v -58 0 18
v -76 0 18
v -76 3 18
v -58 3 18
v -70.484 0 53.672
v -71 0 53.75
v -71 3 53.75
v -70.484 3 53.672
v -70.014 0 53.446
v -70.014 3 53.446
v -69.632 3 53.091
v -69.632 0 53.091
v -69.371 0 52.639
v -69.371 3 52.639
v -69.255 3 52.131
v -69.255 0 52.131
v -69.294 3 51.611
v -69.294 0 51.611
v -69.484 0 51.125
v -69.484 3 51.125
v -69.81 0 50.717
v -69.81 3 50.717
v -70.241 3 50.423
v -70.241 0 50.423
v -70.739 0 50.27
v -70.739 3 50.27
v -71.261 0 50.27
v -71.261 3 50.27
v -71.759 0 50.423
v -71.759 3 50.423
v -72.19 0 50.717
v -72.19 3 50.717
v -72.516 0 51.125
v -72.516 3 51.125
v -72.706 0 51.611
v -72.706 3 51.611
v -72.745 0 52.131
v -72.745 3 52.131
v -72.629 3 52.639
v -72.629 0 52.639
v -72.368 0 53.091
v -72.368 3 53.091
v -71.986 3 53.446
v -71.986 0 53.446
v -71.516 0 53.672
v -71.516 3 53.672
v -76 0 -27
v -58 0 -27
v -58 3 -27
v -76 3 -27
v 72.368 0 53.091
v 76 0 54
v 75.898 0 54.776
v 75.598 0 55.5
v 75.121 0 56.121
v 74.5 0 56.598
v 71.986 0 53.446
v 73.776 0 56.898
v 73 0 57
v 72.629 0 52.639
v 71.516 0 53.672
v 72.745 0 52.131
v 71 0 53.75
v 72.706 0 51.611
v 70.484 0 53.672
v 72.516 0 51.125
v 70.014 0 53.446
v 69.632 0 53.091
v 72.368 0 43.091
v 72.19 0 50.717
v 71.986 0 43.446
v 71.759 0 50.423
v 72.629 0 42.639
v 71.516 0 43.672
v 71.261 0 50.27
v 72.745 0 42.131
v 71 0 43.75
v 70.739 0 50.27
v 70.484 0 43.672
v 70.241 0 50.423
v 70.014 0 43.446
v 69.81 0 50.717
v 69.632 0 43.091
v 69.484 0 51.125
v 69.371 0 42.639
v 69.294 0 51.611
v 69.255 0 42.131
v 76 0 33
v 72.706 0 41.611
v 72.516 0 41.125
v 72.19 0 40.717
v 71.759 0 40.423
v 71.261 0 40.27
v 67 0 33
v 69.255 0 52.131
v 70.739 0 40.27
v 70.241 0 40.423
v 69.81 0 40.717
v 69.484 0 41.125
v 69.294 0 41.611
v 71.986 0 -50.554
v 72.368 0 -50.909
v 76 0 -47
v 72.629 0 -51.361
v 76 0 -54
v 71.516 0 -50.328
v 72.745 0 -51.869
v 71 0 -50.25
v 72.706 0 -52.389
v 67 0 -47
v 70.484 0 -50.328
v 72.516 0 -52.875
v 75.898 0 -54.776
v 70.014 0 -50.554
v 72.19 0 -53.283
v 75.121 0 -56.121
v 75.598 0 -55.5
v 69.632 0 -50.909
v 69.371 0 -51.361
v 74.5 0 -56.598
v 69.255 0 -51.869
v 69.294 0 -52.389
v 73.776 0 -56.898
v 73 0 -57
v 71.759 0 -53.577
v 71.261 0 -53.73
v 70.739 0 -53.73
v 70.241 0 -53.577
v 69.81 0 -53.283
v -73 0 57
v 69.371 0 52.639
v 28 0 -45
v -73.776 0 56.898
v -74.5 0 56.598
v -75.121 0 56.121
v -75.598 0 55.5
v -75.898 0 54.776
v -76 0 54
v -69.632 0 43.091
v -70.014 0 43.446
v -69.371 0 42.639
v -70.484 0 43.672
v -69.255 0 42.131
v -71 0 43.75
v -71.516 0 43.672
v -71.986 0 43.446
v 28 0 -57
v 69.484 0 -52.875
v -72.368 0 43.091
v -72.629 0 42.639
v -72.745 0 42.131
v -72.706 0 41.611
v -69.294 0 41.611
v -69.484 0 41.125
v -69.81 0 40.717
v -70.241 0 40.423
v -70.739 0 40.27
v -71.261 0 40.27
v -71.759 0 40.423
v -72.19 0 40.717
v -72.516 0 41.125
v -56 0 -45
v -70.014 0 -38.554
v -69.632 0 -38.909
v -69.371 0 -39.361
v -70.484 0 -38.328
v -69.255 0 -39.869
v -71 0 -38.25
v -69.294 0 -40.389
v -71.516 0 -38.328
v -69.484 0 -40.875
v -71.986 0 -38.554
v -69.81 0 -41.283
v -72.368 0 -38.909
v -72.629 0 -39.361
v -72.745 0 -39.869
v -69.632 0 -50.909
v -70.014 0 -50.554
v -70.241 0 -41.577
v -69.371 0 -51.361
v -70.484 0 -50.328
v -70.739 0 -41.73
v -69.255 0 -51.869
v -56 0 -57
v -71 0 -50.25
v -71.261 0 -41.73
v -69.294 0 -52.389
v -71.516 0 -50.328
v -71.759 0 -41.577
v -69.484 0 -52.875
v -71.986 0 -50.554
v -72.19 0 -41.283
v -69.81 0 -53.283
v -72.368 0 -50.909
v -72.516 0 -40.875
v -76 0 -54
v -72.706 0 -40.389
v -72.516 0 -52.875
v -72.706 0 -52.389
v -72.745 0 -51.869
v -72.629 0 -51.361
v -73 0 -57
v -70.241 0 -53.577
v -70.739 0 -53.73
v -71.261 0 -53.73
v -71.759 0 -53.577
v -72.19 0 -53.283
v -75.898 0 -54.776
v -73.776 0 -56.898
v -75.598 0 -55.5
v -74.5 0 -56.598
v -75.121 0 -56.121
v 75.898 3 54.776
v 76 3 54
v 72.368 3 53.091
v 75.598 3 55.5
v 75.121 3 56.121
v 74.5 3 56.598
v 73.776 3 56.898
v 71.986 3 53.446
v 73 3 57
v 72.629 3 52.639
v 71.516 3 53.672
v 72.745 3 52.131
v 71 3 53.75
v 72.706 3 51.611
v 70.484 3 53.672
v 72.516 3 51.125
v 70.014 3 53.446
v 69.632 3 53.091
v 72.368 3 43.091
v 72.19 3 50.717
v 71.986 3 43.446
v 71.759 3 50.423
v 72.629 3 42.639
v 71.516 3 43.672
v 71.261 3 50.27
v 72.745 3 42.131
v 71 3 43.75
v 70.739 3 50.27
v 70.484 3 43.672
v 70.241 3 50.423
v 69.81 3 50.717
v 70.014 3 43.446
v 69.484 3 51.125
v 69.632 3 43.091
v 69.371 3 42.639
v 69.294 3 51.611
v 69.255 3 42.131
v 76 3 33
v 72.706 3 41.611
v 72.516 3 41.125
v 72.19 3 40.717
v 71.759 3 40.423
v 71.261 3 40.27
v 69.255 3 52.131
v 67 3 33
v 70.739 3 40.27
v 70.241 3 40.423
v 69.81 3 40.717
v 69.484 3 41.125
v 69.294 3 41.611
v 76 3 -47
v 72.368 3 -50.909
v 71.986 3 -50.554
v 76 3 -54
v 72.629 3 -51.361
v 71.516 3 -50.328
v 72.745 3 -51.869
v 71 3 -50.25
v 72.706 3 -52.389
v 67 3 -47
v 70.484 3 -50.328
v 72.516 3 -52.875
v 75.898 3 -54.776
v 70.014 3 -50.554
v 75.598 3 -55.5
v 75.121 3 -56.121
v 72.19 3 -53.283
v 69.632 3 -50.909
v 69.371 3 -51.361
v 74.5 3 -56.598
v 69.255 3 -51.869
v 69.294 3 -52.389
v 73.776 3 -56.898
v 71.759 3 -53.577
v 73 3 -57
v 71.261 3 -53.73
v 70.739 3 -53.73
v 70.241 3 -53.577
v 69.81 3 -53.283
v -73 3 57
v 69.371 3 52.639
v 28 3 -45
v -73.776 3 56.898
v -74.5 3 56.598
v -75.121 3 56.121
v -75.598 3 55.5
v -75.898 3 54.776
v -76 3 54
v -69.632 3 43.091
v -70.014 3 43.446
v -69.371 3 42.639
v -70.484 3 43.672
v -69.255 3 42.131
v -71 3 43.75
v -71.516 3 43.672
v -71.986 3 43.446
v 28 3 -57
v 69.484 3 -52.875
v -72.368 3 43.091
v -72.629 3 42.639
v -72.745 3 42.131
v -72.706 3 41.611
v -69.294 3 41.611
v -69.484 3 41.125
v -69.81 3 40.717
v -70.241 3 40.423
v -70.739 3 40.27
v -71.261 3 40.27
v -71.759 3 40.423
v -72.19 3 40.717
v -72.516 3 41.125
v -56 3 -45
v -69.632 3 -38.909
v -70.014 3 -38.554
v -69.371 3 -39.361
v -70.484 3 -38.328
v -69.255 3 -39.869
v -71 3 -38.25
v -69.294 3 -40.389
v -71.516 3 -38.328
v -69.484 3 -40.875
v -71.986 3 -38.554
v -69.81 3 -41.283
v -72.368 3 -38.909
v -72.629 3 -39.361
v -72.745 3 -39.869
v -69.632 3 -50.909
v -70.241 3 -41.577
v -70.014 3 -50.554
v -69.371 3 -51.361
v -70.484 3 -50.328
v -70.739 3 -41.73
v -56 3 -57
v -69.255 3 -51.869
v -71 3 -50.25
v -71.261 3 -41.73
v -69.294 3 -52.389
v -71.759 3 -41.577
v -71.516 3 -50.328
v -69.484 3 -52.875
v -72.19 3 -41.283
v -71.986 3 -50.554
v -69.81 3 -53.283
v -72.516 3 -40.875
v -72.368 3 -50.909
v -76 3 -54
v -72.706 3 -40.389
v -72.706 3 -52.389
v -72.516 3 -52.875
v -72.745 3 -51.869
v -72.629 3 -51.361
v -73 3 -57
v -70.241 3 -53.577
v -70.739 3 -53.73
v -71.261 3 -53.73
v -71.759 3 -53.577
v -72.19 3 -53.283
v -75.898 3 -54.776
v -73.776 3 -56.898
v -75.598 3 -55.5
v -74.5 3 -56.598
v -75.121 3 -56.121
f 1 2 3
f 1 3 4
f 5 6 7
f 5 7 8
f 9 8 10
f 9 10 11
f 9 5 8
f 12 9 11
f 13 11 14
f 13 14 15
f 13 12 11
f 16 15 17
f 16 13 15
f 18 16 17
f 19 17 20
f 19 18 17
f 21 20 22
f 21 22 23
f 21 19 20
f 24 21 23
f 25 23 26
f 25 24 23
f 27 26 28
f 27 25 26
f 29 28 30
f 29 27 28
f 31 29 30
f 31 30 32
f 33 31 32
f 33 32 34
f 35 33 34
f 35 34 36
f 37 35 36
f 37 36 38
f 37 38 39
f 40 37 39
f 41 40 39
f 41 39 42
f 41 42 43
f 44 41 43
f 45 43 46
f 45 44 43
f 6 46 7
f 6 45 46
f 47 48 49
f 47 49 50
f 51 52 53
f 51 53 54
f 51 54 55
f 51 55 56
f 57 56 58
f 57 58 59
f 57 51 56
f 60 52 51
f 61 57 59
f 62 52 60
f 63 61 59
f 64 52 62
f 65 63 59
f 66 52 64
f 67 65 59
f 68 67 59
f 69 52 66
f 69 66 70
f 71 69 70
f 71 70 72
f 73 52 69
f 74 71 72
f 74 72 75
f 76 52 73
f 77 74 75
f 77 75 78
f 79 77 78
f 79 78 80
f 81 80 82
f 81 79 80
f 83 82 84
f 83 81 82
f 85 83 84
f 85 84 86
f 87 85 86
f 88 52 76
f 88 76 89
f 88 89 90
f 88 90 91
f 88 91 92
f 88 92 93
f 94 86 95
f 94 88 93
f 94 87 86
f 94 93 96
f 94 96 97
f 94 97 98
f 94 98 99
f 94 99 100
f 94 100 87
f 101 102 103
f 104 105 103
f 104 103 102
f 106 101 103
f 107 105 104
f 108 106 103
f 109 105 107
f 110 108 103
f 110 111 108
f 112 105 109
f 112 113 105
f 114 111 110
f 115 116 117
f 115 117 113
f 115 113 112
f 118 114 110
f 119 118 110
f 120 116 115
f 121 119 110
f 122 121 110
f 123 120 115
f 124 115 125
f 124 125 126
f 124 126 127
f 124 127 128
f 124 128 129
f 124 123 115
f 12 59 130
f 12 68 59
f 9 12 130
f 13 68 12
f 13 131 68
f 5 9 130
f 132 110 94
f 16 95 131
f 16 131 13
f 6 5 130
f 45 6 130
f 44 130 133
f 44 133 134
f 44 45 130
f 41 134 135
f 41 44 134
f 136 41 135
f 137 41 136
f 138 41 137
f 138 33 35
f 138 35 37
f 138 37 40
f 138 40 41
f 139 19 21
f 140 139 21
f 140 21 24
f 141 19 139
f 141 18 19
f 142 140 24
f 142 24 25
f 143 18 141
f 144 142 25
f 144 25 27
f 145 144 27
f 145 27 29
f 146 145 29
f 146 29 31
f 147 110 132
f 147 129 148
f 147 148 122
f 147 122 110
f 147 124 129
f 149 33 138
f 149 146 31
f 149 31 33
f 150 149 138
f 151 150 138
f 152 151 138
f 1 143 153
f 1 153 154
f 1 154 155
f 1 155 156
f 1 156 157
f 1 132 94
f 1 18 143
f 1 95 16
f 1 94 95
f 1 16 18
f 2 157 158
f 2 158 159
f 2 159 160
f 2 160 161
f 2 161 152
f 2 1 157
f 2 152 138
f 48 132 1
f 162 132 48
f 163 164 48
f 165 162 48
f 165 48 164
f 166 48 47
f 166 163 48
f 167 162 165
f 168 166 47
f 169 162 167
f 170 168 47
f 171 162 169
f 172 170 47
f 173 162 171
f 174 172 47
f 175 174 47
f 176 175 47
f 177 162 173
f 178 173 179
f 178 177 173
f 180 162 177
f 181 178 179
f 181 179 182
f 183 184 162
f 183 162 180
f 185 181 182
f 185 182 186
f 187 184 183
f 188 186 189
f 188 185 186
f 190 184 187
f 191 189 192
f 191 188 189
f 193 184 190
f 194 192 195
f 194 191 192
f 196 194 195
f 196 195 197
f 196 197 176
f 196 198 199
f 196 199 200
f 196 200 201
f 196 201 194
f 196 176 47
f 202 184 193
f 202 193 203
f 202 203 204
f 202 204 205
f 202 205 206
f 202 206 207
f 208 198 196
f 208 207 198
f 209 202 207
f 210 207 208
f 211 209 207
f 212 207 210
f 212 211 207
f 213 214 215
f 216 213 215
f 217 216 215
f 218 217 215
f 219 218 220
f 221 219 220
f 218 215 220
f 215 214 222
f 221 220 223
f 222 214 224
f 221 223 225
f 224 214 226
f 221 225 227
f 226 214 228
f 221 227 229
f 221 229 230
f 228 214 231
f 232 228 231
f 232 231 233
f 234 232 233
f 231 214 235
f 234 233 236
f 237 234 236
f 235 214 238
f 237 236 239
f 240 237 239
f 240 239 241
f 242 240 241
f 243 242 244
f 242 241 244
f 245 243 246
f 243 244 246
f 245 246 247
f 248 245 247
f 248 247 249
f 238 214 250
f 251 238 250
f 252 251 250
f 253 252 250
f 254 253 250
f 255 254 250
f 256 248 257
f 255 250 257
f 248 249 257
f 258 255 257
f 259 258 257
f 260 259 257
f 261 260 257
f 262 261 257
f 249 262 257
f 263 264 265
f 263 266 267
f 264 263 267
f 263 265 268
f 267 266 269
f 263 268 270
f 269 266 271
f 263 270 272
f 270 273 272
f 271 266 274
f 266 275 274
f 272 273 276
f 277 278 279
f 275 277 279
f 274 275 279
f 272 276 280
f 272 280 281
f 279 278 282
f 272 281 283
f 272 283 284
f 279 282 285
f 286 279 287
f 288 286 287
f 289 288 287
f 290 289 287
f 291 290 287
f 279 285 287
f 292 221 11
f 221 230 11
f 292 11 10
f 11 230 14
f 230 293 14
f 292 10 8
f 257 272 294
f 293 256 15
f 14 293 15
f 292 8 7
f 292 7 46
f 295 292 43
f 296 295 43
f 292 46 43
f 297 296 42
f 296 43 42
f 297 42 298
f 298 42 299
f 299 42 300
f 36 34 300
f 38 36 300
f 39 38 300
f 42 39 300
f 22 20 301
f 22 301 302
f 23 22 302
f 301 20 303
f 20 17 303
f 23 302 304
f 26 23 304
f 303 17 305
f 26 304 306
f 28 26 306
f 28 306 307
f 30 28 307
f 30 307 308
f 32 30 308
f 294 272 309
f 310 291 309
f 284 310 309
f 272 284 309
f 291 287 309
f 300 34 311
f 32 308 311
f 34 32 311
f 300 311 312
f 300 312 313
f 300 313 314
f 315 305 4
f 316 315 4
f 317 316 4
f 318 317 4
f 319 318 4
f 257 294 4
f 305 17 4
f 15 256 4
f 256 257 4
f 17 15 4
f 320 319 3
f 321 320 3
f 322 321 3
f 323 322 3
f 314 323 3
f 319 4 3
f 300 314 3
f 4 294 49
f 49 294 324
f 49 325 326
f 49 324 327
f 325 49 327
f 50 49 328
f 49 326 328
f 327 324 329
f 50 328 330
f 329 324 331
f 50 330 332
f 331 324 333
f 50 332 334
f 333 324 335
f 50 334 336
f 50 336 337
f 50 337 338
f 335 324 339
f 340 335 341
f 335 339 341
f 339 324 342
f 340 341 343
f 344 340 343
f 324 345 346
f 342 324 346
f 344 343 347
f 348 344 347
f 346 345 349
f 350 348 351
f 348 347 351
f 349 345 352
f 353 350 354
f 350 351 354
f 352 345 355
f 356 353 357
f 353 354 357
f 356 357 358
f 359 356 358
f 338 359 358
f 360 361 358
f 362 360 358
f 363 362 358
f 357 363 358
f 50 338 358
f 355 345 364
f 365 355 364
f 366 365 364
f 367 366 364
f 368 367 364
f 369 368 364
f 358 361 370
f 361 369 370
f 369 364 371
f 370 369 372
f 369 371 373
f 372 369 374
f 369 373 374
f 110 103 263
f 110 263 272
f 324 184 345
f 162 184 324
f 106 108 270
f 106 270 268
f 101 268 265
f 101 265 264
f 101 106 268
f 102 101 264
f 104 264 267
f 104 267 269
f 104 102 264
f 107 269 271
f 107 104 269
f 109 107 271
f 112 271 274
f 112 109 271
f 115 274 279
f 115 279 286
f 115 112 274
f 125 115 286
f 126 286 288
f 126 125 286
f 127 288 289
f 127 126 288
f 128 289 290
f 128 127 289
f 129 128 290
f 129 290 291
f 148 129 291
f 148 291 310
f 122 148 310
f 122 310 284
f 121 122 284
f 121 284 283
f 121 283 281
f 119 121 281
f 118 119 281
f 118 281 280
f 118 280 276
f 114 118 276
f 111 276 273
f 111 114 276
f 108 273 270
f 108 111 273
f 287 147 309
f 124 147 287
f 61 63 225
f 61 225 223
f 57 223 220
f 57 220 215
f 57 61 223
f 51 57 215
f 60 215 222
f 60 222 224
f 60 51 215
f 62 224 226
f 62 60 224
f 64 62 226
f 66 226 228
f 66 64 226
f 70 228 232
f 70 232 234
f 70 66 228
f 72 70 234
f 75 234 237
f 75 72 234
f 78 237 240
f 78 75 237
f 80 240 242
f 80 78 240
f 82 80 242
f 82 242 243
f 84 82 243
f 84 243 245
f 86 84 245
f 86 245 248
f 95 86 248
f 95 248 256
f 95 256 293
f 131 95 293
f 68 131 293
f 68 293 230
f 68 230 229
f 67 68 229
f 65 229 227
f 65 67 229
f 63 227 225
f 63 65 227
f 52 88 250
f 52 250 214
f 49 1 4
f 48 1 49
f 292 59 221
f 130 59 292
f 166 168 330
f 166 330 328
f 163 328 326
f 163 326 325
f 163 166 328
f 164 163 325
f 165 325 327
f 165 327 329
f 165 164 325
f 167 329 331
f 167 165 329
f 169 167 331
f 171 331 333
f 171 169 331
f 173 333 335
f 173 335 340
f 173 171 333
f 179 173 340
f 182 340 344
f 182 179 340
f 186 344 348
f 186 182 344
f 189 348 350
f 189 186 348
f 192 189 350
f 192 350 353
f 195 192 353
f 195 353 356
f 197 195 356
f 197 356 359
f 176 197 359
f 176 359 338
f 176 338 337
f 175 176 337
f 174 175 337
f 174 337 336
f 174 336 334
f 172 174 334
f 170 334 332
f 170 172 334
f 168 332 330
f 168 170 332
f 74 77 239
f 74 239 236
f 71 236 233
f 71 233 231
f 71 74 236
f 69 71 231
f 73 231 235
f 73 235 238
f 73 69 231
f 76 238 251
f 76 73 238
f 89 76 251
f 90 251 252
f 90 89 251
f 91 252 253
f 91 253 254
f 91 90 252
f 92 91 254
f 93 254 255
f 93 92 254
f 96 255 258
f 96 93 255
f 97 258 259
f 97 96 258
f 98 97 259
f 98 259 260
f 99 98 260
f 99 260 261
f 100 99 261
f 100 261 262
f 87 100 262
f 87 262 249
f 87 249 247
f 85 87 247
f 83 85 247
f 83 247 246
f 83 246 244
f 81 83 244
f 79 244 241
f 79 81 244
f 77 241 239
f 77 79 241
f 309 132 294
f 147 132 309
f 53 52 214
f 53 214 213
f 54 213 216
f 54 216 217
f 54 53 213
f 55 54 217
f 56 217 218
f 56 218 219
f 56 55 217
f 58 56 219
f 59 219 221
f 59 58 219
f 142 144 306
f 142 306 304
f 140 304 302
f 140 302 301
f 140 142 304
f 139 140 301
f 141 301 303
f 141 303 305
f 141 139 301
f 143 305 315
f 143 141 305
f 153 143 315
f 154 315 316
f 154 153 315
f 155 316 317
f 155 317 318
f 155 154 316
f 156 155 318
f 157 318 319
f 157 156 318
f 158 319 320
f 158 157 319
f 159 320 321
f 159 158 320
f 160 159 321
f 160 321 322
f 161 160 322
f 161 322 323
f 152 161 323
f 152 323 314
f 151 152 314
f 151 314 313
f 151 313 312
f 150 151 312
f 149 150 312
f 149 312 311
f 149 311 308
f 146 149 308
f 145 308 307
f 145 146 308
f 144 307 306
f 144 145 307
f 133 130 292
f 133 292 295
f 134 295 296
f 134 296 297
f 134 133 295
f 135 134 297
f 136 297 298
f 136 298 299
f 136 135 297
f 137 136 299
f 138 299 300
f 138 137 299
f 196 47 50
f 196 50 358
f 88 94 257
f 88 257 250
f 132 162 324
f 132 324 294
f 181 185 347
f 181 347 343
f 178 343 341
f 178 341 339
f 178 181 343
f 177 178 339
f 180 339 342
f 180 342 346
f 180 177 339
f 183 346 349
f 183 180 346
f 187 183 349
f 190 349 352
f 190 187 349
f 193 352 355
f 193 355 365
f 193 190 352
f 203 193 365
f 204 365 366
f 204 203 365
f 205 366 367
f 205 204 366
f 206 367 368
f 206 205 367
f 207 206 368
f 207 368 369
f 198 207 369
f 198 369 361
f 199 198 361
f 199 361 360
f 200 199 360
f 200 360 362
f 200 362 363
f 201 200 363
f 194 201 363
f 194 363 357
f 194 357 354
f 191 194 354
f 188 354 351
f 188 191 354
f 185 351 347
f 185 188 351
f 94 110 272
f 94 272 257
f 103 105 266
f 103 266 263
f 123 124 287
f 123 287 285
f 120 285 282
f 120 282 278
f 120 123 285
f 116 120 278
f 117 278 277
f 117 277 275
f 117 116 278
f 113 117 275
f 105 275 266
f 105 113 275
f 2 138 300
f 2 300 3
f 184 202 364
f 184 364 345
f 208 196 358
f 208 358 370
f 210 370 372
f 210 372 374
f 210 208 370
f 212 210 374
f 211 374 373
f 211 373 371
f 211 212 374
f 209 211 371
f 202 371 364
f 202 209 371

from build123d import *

# Parameters (mm, degrees)
SKETCH_1_R      = 1.75
EXTRUDE_1_DEPTH = 3


with BuildPart() as part:
    # 草图1 → 凸台-拉伸1 (new body)
    with BuildSketch(Plane(origin=(0, 0, 0), x_dir=(1, 0, 0), z_dir=(0, 1, 0))):
        with BuildLine():
            Line((-56, 57), (-56, 45))
            Line((-56, 45), (28, 45))
            Line((28, 45), (28, 57))
            Line((28, 57), (73, 57))
            ThreePointArc((73, 57), (75.121320344, 56.121320344), (76, 54))
            Line((76, 54), (76, 47))
            Line((76, 47), (67, 47))
            Line((67, 47), (67, -33))
            Line((67, -33), (76, -33))
            Line((76, -33), (76, -54))
            ThreePointArc((76, -54), (75.121320344, -56.121320344), (73, -57))
            Line((73, -57), (-73, -57))
            ThreePointArc((-73, -57), (-75.121320344, -56.121320344), (-76, -54))
            Line((-76, -54), (-76, -18))
            Line((-76, -18), (-58, -18))
            Line((-58, -18), (-58, 27))
            Line((-58, 27), (-76, 27))
            Line((-76, 27), (-76, 54))
            ThreePointArc((-76, 54), (-75.121320344, 56.121320344), (-73, 57))
            Line((-73, 57), (-56, 57))
        make_face()
        with Locations((-71, 52)):
            Circle(SKETCH_1_R, mode=Mode.SUBTRACT)
        with Locations((71, 52)):
            Circle(SKETCH_1_R, mode=Mode.SUBTRACT)
        with Locations((71, -52)):
            Circle(SKETCH_1_R, mode=Mode.SUBTRACT)
        with Locations((-71, -52)):
            Circle(SKETCH_1_R, mode=Mode.SUBTRACT)
        with Locations((-71, 40)):
            Circle(SKETCH_1_R, mode=Mode.SUBTRACT)
        with Locations((71, -42)):
            Circle(SKETCH_1_R, mode=Mode.SUBTRACT)
        with Locations((-71, -42)):
            Circle(SKETCH_1_R, mode=Mode.SUBTRACT)
    extrude(amount=EXTRUDE_1_DEPTH)


solid = part.part
